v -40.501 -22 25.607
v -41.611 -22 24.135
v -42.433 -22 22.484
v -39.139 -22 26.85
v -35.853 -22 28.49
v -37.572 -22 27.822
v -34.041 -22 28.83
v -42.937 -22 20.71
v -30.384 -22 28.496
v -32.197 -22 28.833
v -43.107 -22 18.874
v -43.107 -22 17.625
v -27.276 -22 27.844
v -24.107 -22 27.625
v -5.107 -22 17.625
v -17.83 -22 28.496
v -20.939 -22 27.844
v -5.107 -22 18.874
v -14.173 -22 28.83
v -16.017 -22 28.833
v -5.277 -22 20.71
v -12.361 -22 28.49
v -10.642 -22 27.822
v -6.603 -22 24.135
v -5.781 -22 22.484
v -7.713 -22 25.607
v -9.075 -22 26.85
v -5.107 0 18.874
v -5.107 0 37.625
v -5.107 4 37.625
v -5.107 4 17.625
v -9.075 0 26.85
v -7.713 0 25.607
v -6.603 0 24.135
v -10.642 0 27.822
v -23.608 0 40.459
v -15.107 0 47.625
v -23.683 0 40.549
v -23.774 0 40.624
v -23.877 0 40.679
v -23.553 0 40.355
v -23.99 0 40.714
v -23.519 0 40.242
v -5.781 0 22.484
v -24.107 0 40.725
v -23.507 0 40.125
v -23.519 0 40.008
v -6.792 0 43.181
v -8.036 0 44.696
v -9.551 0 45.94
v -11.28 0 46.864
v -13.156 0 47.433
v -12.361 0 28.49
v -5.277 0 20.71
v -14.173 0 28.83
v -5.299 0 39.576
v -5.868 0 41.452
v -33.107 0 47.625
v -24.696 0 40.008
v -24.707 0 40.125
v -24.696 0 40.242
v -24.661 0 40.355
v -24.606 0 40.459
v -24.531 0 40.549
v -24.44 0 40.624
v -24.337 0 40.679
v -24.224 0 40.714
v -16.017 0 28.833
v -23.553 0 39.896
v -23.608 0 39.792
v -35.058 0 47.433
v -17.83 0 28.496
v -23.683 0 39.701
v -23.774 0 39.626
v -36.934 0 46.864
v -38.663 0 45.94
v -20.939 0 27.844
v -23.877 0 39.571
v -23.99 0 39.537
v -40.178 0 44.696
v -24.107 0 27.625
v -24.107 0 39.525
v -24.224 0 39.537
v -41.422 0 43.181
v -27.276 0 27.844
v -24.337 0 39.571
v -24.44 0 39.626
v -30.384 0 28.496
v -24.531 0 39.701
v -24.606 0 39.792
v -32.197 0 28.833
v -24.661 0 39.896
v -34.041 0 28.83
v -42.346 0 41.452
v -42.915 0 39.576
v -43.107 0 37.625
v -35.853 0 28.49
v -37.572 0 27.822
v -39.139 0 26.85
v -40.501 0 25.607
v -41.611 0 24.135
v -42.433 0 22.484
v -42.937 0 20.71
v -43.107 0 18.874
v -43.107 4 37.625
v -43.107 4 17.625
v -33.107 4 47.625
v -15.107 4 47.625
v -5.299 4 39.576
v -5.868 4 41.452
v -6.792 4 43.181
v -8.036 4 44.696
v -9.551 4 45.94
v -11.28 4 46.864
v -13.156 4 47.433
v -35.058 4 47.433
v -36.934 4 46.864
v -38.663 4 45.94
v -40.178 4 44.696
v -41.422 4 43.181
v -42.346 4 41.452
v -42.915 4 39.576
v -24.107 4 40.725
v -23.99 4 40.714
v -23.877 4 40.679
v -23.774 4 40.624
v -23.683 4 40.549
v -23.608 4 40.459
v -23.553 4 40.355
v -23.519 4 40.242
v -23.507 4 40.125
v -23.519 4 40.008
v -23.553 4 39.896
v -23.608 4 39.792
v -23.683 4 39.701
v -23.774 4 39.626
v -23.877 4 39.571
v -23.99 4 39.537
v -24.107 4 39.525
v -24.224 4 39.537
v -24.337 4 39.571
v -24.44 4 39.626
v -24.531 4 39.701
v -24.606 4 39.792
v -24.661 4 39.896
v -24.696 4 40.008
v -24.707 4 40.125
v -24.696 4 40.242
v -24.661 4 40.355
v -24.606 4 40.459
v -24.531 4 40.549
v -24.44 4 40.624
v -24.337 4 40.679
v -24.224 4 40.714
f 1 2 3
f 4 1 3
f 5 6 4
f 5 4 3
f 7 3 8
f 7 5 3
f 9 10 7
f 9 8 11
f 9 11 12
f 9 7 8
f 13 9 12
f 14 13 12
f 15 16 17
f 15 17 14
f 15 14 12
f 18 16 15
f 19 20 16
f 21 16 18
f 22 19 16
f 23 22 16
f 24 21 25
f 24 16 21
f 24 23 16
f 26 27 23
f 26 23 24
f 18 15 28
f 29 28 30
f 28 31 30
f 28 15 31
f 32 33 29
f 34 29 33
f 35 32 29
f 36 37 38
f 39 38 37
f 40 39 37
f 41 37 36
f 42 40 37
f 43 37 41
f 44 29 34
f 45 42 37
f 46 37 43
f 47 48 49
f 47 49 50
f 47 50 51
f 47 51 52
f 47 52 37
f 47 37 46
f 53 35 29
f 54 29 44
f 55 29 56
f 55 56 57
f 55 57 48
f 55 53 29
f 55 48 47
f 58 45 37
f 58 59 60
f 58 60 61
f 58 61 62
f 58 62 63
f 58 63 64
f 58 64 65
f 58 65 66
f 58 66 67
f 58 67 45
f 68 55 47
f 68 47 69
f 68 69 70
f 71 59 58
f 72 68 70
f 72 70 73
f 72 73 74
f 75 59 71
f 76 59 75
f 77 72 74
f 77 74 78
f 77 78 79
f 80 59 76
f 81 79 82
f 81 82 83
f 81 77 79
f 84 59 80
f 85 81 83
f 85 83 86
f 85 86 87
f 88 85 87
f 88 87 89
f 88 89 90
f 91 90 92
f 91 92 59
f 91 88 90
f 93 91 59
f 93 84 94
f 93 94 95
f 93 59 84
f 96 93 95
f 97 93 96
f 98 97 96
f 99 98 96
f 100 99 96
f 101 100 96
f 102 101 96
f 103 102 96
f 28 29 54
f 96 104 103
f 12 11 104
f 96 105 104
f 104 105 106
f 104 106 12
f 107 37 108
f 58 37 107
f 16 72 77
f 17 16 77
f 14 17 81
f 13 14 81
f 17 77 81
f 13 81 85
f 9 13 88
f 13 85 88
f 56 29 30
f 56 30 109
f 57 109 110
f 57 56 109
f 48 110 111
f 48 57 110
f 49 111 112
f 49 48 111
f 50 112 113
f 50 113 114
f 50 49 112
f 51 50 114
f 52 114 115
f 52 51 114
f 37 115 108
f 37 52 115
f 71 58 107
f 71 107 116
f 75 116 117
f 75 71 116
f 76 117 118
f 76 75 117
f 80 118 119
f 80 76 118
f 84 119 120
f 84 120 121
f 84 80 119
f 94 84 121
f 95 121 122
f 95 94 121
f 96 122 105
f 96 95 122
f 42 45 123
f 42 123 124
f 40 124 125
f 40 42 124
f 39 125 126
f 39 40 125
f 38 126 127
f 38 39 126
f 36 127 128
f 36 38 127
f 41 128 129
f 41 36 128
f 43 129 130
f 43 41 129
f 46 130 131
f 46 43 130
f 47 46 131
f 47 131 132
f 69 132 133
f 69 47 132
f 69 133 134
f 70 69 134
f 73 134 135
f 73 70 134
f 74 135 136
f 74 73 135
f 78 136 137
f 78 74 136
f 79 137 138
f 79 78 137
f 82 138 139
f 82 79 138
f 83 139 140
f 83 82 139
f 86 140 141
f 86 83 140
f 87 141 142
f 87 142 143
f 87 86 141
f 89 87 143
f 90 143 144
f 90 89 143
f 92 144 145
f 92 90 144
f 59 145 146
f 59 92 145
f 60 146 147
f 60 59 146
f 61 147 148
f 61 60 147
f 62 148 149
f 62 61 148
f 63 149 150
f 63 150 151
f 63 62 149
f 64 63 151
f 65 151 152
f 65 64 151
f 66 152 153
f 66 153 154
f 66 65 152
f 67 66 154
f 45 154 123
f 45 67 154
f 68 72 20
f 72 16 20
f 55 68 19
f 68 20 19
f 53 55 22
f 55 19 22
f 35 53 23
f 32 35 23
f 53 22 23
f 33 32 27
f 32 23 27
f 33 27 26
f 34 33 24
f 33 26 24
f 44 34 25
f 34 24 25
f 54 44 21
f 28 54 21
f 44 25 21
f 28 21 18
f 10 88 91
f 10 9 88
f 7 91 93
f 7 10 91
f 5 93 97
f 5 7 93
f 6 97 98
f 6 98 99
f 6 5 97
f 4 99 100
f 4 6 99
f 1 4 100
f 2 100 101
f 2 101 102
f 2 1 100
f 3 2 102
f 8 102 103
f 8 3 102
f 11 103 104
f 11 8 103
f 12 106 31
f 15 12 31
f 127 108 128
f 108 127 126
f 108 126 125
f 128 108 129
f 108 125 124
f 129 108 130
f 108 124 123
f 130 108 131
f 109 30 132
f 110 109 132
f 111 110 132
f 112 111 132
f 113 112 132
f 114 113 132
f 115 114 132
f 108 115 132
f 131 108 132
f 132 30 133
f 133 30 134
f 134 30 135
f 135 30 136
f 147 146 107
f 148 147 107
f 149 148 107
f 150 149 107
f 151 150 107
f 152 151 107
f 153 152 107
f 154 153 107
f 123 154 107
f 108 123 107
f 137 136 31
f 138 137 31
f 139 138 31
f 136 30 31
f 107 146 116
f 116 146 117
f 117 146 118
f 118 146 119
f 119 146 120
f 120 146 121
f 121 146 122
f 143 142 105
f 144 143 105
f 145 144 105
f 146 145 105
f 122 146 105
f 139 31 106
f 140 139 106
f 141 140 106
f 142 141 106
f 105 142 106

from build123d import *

# Parameters (mm, degrees)
CROQUIS2_R              = 0.6
SALIENTE_EXTRUIR1_DEPTH = 4
SALIENTE_EXTRUIR2_DEPTH = 22
REDONDEO1_R             = 10
REDONDEO2_R             = 10


with BuildPart() as part:
    # Croquis2 → Saliente-Extruir1 (new body)
    with BuildSketch(Plane(origin=(0, 0, 0), x_dir=(1, 0, 0), z_dir=(0, 1, 0))):
        with BuildLine():
            Line((-43.107082341, -17.625158928), (-5.107082341, -17.625158928))
            Line((-5.107082341, -17.625158928), (-5.107082341, -37.625158928))
            ThreePointArc((-5.107082341, -37.625158928), (-8.036014529, -44.69622674), (-15.107082341, -47.625158928))
            Line((-15.107082341, -47.625158928), (-33.107082341, -47.625158928))
            ThreePointArc((-33.107082341, -47.625158928), (-40.178150153, -44.69622674), (-43.107082341, -37.625158928))
            Line((-43.107082341, -37.625158928), (-43.107082341, -17.625158928))
        make_face()
        with Locations(Location((-24.107082341, -40.125158928, 0), (0, 0, 270))):
            Circle(CROQUIS2_R, mode=Mode.SUBTRACT)
    extrude(amount=SALIENTE_EXTRUIR1_DEPTH)

    # Croquis3 → Saliente-Extruir2 (add)
    with BuildSketch(Plane.XZ):
        with BuildLine():
            Line((-43.107082341, 17.625158928), (-5.107082341, 17.625158928))
            Line((-5.107082341, 17.625158928), (-5.107082341, 37.625158928))
            ThreePointArc((-5.107082341, 37.625158928), (-24.107082341, 27.625158928), (-43.107082341, 37.625158928))
            Line((-43.107082341, 37.625158928), (-43.107082341, 17.625158928))
        make_face()
    extrude(amount=SALIENTE_EXTRUIR2_DEPTH)

    # Redondeo1
    redondeo1_edges = [part.edges().sort_by_distance(p)[0] for p in [
        (-43.107082341, -11, 37.625158928),
    ]]
    fillet(redondeo1_edges, radius=REDONDEO1_R)

    # Redondeo2
    redondeo2_edges = [part.edges().sort_by_distance(p)[0] for p in [
        (-5.107082341, -11, 37.625158928),
    ]]
    fillet(redondeo2_edges, radius=REDONDEO2_R)


solid = part.part
